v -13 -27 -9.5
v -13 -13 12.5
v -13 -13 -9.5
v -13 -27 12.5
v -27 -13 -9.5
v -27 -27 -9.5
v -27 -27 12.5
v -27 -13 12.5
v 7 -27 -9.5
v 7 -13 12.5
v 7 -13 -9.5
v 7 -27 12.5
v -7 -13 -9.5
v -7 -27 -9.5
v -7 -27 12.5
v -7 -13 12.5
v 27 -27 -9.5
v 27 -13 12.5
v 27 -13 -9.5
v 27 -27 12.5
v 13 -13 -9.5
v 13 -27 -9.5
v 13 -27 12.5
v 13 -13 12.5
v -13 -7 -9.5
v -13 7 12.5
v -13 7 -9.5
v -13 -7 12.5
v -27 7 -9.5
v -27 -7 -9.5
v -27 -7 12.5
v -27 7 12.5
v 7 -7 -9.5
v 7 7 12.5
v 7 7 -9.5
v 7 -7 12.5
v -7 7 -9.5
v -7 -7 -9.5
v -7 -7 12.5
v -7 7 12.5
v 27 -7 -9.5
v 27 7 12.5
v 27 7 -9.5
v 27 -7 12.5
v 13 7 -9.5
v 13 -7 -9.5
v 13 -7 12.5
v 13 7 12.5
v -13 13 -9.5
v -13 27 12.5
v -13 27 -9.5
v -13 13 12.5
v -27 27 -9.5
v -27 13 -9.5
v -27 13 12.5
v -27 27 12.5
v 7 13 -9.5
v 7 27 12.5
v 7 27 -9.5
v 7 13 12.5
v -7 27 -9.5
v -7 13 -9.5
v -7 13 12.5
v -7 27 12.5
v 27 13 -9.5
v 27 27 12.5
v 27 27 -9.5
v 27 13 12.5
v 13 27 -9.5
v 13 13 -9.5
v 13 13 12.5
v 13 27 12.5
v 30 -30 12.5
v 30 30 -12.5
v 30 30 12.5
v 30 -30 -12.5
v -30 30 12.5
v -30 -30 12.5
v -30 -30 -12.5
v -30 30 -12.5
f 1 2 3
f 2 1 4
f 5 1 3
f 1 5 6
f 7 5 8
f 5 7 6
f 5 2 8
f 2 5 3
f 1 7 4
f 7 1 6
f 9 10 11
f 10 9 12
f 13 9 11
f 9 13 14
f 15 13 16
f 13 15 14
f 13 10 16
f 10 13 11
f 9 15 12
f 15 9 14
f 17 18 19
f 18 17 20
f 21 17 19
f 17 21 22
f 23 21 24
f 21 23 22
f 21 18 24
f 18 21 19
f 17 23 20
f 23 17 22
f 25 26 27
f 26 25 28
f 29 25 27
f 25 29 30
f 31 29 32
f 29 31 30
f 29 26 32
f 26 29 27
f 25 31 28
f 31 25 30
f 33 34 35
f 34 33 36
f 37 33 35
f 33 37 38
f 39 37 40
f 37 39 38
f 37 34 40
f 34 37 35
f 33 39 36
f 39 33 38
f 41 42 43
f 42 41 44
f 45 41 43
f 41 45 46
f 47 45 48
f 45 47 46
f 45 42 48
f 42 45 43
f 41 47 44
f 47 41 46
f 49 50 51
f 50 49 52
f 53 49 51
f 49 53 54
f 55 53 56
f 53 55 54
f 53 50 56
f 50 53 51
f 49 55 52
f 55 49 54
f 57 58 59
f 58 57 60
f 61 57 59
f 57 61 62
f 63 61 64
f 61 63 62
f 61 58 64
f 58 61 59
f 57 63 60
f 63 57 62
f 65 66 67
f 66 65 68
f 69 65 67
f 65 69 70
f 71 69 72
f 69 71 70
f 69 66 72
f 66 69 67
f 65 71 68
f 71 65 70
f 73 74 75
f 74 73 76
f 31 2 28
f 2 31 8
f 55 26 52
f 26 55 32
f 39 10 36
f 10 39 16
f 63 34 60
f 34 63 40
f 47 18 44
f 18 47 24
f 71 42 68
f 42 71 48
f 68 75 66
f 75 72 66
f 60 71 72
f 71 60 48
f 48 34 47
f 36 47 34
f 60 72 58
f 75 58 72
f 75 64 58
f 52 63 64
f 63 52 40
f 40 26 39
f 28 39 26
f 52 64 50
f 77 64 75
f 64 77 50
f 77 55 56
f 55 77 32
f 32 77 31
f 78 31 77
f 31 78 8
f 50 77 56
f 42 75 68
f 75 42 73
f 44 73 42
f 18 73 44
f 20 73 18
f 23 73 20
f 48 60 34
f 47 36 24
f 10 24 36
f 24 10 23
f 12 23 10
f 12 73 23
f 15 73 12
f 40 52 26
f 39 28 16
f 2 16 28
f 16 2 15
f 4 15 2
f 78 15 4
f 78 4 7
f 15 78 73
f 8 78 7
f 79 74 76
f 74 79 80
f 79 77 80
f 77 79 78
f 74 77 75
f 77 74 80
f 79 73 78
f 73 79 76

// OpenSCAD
$fn = 32;

// ----------------------------------------------------------------------
// Pocket plate 60 x 60 x 25
// 3 x 3 pockets 14 mm square, 22 mm deep
// ----------------------------------------------------------------------

// --- parameters (mm) ---
thickness = 25;  // plate thickness
floor_t = 3;     // material left under each pocket
pocket = 14;     // pocket side length
pitch_x = 20;    // pocket pitch along X
pitch_y = 20;    // pocket pitch along Y
cols = 3;        // pockets per row
rows = 3;        // rows of pockets

// --- derived feature positions (mm) ---
depth = thickness - floor_t;        // = 22   pocket depth, down to the floor
span_x = (cols - 1) * pitch_x;      // = 40   distance between outer pockets
span_y = (rows - 1) * pitch_y;      // = 40   distance between outer pocket rows
origin_x = -span_x / 2;             // = -20   X of the first pocket
origin_y = -span_y / 2;             // = -20   Y of the first pocket
plate = [span_x + pocket + 6, span_y + pocket + 6, thickness];  // = [60, 60, 25]   overall size: pockets plus 3 mm of wall on each side
feature_centers = [
  [origin_x + 0 * pitch_x, origin_y + 0 * pitch_y],
  [origin_x + 1 * pitch_x, origin_y + 0 * pitch_y],
  [origin_x + 2 * pitch_x, origin_y + 0 * pitch_y],
  [origin_x + 0 * pitch_x, origin_y + 1 * pitch_y],
  [origin_x + 1 * pitch_x, origin_y + 1 * pitch_y],
  [origin_x + 2 * pitch_x, origin_y + 1 * pitch_y],
  [origin_x + 0 * pitch_x, origin_y + 2 * pitch_y],
  [origin_x + 1 * pitch_x, origin_y + 2 * pitch_y],
  [origin_x + 2 * pitch_x, origin_y + 2 * pitch_y]
];   // pocket centres, used verbatim by the cutter loop

// plate outline, then one pocket per centre in feature_centers
difference() {
  cube(plate, center = true);
  for (centre = feature_centers)
    translate([centre[0] - pocket / 2, centre[1] - pocket / 2, plate[2] / 2 - depth])
      cube([pocket, pocket, depth + 1]);  // centred on the declared pocket centre
}
